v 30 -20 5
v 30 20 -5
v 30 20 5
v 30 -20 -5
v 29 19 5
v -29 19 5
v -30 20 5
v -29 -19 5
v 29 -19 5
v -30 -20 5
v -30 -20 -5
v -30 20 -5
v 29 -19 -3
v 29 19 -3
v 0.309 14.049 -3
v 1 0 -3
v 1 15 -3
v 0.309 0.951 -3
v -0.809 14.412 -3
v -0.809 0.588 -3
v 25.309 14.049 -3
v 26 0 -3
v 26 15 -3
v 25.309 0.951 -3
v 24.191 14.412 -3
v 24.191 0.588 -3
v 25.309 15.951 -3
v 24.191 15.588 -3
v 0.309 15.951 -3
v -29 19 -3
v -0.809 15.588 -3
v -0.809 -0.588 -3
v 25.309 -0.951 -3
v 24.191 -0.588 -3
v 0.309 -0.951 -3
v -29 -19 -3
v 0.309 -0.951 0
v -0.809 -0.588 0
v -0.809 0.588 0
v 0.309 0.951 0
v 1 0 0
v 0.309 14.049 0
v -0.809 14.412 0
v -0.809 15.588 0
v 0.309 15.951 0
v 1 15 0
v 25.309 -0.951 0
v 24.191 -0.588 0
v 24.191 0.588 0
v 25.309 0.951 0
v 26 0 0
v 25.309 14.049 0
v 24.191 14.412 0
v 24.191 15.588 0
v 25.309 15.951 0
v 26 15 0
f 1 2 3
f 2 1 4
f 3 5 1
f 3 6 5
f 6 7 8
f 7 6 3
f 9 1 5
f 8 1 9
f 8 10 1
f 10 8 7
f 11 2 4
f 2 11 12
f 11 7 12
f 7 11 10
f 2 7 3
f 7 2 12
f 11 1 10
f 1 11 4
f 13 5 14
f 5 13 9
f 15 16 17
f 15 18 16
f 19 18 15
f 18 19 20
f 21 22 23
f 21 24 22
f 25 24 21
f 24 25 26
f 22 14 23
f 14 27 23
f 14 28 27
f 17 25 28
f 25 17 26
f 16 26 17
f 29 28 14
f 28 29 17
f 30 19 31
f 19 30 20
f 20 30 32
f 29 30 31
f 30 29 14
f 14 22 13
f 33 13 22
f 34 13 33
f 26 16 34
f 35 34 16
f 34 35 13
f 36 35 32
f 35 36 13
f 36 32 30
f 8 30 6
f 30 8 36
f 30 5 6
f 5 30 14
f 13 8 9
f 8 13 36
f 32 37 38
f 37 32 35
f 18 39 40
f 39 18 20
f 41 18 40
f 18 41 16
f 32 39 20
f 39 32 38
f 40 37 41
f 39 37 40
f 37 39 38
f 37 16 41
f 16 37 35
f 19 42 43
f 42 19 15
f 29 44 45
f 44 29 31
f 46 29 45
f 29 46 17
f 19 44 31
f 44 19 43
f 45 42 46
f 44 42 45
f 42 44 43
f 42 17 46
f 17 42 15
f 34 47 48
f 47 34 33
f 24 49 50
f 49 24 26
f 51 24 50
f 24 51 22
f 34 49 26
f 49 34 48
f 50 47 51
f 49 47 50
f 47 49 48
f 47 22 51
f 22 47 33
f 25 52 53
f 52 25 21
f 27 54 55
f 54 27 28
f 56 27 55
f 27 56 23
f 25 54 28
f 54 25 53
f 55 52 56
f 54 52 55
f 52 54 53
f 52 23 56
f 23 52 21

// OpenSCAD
module sensorPackageHalf() {
difference() {
		//the original cube
		cube([60,40,10],center=true);

		//the diff cube less in x,y by 2 and offset in z giving a 
		//thickness of 2 on all sides
		translate([0,0,2]) {
			cube([58,38,10],center=true);
		}
	}
	translate([0,0,-5]) {
		cylinder(5,r=1,center=false);
	} 
	translate([0,15,-5]) {
		cylinder(5,r=1,center=false);
	} 
	translate([25,0,-5]) {
		cylinder(5,r=1,center=false);
	} 
	translate([25,15,-5]) {
		cylinder(5,r=1,center=false);
	} 
}
sensorPackageHalf();
